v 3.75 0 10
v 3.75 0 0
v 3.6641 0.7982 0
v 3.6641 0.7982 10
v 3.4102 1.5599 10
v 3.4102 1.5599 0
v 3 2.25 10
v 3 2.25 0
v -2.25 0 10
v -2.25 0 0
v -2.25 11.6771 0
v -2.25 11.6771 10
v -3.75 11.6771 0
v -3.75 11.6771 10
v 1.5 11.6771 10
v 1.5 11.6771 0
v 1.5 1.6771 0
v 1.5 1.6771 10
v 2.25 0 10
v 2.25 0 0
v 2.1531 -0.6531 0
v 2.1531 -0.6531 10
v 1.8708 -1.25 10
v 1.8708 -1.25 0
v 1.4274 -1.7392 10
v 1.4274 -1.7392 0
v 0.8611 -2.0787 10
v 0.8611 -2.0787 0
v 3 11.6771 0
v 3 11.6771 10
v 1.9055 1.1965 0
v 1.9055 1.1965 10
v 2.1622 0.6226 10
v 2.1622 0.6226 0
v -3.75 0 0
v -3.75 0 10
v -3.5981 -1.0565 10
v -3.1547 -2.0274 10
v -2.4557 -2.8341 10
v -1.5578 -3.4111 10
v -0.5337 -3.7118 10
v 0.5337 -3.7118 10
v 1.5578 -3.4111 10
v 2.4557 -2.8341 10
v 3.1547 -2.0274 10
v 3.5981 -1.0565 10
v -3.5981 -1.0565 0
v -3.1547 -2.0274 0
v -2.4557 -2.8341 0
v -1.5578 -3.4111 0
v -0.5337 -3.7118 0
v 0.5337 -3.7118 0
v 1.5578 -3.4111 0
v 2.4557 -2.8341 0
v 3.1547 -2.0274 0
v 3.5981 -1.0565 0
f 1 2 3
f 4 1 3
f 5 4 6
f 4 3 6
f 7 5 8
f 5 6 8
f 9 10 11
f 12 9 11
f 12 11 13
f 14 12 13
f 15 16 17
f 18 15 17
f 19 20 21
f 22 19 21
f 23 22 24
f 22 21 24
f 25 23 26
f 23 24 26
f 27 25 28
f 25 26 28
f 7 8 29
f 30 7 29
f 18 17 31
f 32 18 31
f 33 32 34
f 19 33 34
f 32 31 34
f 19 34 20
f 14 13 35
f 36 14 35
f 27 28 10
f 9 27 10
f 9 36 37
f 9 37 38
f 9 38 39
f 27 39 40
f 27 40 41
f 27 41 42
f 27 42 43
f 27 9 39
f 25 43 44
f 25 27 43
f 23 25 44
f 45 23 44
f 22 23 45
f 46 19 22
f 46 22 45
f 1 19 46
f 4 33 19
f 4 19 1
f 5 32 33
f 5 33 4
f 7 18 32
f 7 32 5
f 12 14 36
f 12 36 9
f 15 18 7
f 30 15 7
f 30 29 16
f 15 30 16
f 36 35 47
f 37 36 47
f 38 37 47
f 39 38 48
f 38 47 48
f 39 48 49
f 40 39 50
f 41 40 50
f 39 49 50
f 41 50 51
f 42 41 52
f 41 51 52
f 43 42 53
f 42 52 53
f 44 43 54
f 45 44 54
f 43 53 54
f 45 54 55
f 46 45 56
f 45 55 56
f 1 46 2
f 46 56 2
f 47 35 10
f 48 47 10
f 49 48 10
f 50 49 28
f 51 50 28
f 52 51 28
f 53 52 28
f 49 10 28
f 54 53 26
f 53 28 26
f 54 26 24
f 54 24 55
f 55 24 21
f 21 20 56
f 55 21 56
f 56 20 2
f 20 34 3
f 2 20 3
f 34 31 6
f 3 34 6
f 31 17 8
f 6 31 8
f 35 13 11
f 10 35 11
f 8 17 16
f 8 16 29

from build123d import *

# Parameters (mm, degrees)
F1_DEPTH = 10


# Not quite as in the source:
# - a feature names something its author has since deleted; it is built from what else it names


with BuildPart() as f1:
    # F0 (on Top) → F1 (new body)
    with BuildSketch(Plane.XY):
        with BuildLine():
            ThreePointArc((-3.75, 0), (-3.3541019662, 1.6770509831), (-2.25, 3))
            Line((-2.25, 3), (-2.25, 11.6770509831))
            Line((-2.25, 11.6770509831), (-3.75, 11.6770509831))
            Line((-3.75, 11.6770509831), (-3.75, 0))
        make_face()
        with BuildLine():
            ThreePointArc((1.5, 1.6770509831), (2.0539595906, 0.9185586535), (2.25, 0))
            ThreePointArc((2.25, 0), (1.8708286934, -1.25), (0.8611111111, -2.0786985482))
            ThreePointArc((0.8611111111, -2.0786985482), (-1.25, -1.8708286934), (-2.25, 0))
            Line((-2.25, 0), (-2.25, 3))
            ThreePointArc((-2.25, 3), (-3.3541019662, 1.6770509831), (-3.75, 0))
            ThreePointArc((-3.75, 0), (0, -3.75), (3.75, 0))
            ThreePointArc((3.75, 0), (3.5575623677, 1.1858541226), (3, 2.25))
            ThreePointArc((3, 2.25), (2.3269511721, 2.9407139002), (1.5, 3.4369317712))
            Line((1.5, 3.4369317712), (1.5, 1.6770509831))
        make_face()
        with BuildLine():
            Line((1.5, 11.6770509831), (1.5, 3.4369317712))
            ThreePointArc((1.5, 3.4369317712), (2.3269511721, 2.9407139002), (3, 2.25))
            Line((3, 2.25), (3, 11.6770509831))
            Line((3, 11.6770509831), (1.5, 11.6770509831))
        make_face()
        with BuildLine():
            ThreePointArc((-2.25, 0), (-1.25, -1.8708286934), (0.8611111111, -2.0786985482))
            Line((0.8611111111, -2.0786985482), (-2.25, 0))
        make_face()
    extrude(amount=F1_DEPTH)


solid = f1.part
